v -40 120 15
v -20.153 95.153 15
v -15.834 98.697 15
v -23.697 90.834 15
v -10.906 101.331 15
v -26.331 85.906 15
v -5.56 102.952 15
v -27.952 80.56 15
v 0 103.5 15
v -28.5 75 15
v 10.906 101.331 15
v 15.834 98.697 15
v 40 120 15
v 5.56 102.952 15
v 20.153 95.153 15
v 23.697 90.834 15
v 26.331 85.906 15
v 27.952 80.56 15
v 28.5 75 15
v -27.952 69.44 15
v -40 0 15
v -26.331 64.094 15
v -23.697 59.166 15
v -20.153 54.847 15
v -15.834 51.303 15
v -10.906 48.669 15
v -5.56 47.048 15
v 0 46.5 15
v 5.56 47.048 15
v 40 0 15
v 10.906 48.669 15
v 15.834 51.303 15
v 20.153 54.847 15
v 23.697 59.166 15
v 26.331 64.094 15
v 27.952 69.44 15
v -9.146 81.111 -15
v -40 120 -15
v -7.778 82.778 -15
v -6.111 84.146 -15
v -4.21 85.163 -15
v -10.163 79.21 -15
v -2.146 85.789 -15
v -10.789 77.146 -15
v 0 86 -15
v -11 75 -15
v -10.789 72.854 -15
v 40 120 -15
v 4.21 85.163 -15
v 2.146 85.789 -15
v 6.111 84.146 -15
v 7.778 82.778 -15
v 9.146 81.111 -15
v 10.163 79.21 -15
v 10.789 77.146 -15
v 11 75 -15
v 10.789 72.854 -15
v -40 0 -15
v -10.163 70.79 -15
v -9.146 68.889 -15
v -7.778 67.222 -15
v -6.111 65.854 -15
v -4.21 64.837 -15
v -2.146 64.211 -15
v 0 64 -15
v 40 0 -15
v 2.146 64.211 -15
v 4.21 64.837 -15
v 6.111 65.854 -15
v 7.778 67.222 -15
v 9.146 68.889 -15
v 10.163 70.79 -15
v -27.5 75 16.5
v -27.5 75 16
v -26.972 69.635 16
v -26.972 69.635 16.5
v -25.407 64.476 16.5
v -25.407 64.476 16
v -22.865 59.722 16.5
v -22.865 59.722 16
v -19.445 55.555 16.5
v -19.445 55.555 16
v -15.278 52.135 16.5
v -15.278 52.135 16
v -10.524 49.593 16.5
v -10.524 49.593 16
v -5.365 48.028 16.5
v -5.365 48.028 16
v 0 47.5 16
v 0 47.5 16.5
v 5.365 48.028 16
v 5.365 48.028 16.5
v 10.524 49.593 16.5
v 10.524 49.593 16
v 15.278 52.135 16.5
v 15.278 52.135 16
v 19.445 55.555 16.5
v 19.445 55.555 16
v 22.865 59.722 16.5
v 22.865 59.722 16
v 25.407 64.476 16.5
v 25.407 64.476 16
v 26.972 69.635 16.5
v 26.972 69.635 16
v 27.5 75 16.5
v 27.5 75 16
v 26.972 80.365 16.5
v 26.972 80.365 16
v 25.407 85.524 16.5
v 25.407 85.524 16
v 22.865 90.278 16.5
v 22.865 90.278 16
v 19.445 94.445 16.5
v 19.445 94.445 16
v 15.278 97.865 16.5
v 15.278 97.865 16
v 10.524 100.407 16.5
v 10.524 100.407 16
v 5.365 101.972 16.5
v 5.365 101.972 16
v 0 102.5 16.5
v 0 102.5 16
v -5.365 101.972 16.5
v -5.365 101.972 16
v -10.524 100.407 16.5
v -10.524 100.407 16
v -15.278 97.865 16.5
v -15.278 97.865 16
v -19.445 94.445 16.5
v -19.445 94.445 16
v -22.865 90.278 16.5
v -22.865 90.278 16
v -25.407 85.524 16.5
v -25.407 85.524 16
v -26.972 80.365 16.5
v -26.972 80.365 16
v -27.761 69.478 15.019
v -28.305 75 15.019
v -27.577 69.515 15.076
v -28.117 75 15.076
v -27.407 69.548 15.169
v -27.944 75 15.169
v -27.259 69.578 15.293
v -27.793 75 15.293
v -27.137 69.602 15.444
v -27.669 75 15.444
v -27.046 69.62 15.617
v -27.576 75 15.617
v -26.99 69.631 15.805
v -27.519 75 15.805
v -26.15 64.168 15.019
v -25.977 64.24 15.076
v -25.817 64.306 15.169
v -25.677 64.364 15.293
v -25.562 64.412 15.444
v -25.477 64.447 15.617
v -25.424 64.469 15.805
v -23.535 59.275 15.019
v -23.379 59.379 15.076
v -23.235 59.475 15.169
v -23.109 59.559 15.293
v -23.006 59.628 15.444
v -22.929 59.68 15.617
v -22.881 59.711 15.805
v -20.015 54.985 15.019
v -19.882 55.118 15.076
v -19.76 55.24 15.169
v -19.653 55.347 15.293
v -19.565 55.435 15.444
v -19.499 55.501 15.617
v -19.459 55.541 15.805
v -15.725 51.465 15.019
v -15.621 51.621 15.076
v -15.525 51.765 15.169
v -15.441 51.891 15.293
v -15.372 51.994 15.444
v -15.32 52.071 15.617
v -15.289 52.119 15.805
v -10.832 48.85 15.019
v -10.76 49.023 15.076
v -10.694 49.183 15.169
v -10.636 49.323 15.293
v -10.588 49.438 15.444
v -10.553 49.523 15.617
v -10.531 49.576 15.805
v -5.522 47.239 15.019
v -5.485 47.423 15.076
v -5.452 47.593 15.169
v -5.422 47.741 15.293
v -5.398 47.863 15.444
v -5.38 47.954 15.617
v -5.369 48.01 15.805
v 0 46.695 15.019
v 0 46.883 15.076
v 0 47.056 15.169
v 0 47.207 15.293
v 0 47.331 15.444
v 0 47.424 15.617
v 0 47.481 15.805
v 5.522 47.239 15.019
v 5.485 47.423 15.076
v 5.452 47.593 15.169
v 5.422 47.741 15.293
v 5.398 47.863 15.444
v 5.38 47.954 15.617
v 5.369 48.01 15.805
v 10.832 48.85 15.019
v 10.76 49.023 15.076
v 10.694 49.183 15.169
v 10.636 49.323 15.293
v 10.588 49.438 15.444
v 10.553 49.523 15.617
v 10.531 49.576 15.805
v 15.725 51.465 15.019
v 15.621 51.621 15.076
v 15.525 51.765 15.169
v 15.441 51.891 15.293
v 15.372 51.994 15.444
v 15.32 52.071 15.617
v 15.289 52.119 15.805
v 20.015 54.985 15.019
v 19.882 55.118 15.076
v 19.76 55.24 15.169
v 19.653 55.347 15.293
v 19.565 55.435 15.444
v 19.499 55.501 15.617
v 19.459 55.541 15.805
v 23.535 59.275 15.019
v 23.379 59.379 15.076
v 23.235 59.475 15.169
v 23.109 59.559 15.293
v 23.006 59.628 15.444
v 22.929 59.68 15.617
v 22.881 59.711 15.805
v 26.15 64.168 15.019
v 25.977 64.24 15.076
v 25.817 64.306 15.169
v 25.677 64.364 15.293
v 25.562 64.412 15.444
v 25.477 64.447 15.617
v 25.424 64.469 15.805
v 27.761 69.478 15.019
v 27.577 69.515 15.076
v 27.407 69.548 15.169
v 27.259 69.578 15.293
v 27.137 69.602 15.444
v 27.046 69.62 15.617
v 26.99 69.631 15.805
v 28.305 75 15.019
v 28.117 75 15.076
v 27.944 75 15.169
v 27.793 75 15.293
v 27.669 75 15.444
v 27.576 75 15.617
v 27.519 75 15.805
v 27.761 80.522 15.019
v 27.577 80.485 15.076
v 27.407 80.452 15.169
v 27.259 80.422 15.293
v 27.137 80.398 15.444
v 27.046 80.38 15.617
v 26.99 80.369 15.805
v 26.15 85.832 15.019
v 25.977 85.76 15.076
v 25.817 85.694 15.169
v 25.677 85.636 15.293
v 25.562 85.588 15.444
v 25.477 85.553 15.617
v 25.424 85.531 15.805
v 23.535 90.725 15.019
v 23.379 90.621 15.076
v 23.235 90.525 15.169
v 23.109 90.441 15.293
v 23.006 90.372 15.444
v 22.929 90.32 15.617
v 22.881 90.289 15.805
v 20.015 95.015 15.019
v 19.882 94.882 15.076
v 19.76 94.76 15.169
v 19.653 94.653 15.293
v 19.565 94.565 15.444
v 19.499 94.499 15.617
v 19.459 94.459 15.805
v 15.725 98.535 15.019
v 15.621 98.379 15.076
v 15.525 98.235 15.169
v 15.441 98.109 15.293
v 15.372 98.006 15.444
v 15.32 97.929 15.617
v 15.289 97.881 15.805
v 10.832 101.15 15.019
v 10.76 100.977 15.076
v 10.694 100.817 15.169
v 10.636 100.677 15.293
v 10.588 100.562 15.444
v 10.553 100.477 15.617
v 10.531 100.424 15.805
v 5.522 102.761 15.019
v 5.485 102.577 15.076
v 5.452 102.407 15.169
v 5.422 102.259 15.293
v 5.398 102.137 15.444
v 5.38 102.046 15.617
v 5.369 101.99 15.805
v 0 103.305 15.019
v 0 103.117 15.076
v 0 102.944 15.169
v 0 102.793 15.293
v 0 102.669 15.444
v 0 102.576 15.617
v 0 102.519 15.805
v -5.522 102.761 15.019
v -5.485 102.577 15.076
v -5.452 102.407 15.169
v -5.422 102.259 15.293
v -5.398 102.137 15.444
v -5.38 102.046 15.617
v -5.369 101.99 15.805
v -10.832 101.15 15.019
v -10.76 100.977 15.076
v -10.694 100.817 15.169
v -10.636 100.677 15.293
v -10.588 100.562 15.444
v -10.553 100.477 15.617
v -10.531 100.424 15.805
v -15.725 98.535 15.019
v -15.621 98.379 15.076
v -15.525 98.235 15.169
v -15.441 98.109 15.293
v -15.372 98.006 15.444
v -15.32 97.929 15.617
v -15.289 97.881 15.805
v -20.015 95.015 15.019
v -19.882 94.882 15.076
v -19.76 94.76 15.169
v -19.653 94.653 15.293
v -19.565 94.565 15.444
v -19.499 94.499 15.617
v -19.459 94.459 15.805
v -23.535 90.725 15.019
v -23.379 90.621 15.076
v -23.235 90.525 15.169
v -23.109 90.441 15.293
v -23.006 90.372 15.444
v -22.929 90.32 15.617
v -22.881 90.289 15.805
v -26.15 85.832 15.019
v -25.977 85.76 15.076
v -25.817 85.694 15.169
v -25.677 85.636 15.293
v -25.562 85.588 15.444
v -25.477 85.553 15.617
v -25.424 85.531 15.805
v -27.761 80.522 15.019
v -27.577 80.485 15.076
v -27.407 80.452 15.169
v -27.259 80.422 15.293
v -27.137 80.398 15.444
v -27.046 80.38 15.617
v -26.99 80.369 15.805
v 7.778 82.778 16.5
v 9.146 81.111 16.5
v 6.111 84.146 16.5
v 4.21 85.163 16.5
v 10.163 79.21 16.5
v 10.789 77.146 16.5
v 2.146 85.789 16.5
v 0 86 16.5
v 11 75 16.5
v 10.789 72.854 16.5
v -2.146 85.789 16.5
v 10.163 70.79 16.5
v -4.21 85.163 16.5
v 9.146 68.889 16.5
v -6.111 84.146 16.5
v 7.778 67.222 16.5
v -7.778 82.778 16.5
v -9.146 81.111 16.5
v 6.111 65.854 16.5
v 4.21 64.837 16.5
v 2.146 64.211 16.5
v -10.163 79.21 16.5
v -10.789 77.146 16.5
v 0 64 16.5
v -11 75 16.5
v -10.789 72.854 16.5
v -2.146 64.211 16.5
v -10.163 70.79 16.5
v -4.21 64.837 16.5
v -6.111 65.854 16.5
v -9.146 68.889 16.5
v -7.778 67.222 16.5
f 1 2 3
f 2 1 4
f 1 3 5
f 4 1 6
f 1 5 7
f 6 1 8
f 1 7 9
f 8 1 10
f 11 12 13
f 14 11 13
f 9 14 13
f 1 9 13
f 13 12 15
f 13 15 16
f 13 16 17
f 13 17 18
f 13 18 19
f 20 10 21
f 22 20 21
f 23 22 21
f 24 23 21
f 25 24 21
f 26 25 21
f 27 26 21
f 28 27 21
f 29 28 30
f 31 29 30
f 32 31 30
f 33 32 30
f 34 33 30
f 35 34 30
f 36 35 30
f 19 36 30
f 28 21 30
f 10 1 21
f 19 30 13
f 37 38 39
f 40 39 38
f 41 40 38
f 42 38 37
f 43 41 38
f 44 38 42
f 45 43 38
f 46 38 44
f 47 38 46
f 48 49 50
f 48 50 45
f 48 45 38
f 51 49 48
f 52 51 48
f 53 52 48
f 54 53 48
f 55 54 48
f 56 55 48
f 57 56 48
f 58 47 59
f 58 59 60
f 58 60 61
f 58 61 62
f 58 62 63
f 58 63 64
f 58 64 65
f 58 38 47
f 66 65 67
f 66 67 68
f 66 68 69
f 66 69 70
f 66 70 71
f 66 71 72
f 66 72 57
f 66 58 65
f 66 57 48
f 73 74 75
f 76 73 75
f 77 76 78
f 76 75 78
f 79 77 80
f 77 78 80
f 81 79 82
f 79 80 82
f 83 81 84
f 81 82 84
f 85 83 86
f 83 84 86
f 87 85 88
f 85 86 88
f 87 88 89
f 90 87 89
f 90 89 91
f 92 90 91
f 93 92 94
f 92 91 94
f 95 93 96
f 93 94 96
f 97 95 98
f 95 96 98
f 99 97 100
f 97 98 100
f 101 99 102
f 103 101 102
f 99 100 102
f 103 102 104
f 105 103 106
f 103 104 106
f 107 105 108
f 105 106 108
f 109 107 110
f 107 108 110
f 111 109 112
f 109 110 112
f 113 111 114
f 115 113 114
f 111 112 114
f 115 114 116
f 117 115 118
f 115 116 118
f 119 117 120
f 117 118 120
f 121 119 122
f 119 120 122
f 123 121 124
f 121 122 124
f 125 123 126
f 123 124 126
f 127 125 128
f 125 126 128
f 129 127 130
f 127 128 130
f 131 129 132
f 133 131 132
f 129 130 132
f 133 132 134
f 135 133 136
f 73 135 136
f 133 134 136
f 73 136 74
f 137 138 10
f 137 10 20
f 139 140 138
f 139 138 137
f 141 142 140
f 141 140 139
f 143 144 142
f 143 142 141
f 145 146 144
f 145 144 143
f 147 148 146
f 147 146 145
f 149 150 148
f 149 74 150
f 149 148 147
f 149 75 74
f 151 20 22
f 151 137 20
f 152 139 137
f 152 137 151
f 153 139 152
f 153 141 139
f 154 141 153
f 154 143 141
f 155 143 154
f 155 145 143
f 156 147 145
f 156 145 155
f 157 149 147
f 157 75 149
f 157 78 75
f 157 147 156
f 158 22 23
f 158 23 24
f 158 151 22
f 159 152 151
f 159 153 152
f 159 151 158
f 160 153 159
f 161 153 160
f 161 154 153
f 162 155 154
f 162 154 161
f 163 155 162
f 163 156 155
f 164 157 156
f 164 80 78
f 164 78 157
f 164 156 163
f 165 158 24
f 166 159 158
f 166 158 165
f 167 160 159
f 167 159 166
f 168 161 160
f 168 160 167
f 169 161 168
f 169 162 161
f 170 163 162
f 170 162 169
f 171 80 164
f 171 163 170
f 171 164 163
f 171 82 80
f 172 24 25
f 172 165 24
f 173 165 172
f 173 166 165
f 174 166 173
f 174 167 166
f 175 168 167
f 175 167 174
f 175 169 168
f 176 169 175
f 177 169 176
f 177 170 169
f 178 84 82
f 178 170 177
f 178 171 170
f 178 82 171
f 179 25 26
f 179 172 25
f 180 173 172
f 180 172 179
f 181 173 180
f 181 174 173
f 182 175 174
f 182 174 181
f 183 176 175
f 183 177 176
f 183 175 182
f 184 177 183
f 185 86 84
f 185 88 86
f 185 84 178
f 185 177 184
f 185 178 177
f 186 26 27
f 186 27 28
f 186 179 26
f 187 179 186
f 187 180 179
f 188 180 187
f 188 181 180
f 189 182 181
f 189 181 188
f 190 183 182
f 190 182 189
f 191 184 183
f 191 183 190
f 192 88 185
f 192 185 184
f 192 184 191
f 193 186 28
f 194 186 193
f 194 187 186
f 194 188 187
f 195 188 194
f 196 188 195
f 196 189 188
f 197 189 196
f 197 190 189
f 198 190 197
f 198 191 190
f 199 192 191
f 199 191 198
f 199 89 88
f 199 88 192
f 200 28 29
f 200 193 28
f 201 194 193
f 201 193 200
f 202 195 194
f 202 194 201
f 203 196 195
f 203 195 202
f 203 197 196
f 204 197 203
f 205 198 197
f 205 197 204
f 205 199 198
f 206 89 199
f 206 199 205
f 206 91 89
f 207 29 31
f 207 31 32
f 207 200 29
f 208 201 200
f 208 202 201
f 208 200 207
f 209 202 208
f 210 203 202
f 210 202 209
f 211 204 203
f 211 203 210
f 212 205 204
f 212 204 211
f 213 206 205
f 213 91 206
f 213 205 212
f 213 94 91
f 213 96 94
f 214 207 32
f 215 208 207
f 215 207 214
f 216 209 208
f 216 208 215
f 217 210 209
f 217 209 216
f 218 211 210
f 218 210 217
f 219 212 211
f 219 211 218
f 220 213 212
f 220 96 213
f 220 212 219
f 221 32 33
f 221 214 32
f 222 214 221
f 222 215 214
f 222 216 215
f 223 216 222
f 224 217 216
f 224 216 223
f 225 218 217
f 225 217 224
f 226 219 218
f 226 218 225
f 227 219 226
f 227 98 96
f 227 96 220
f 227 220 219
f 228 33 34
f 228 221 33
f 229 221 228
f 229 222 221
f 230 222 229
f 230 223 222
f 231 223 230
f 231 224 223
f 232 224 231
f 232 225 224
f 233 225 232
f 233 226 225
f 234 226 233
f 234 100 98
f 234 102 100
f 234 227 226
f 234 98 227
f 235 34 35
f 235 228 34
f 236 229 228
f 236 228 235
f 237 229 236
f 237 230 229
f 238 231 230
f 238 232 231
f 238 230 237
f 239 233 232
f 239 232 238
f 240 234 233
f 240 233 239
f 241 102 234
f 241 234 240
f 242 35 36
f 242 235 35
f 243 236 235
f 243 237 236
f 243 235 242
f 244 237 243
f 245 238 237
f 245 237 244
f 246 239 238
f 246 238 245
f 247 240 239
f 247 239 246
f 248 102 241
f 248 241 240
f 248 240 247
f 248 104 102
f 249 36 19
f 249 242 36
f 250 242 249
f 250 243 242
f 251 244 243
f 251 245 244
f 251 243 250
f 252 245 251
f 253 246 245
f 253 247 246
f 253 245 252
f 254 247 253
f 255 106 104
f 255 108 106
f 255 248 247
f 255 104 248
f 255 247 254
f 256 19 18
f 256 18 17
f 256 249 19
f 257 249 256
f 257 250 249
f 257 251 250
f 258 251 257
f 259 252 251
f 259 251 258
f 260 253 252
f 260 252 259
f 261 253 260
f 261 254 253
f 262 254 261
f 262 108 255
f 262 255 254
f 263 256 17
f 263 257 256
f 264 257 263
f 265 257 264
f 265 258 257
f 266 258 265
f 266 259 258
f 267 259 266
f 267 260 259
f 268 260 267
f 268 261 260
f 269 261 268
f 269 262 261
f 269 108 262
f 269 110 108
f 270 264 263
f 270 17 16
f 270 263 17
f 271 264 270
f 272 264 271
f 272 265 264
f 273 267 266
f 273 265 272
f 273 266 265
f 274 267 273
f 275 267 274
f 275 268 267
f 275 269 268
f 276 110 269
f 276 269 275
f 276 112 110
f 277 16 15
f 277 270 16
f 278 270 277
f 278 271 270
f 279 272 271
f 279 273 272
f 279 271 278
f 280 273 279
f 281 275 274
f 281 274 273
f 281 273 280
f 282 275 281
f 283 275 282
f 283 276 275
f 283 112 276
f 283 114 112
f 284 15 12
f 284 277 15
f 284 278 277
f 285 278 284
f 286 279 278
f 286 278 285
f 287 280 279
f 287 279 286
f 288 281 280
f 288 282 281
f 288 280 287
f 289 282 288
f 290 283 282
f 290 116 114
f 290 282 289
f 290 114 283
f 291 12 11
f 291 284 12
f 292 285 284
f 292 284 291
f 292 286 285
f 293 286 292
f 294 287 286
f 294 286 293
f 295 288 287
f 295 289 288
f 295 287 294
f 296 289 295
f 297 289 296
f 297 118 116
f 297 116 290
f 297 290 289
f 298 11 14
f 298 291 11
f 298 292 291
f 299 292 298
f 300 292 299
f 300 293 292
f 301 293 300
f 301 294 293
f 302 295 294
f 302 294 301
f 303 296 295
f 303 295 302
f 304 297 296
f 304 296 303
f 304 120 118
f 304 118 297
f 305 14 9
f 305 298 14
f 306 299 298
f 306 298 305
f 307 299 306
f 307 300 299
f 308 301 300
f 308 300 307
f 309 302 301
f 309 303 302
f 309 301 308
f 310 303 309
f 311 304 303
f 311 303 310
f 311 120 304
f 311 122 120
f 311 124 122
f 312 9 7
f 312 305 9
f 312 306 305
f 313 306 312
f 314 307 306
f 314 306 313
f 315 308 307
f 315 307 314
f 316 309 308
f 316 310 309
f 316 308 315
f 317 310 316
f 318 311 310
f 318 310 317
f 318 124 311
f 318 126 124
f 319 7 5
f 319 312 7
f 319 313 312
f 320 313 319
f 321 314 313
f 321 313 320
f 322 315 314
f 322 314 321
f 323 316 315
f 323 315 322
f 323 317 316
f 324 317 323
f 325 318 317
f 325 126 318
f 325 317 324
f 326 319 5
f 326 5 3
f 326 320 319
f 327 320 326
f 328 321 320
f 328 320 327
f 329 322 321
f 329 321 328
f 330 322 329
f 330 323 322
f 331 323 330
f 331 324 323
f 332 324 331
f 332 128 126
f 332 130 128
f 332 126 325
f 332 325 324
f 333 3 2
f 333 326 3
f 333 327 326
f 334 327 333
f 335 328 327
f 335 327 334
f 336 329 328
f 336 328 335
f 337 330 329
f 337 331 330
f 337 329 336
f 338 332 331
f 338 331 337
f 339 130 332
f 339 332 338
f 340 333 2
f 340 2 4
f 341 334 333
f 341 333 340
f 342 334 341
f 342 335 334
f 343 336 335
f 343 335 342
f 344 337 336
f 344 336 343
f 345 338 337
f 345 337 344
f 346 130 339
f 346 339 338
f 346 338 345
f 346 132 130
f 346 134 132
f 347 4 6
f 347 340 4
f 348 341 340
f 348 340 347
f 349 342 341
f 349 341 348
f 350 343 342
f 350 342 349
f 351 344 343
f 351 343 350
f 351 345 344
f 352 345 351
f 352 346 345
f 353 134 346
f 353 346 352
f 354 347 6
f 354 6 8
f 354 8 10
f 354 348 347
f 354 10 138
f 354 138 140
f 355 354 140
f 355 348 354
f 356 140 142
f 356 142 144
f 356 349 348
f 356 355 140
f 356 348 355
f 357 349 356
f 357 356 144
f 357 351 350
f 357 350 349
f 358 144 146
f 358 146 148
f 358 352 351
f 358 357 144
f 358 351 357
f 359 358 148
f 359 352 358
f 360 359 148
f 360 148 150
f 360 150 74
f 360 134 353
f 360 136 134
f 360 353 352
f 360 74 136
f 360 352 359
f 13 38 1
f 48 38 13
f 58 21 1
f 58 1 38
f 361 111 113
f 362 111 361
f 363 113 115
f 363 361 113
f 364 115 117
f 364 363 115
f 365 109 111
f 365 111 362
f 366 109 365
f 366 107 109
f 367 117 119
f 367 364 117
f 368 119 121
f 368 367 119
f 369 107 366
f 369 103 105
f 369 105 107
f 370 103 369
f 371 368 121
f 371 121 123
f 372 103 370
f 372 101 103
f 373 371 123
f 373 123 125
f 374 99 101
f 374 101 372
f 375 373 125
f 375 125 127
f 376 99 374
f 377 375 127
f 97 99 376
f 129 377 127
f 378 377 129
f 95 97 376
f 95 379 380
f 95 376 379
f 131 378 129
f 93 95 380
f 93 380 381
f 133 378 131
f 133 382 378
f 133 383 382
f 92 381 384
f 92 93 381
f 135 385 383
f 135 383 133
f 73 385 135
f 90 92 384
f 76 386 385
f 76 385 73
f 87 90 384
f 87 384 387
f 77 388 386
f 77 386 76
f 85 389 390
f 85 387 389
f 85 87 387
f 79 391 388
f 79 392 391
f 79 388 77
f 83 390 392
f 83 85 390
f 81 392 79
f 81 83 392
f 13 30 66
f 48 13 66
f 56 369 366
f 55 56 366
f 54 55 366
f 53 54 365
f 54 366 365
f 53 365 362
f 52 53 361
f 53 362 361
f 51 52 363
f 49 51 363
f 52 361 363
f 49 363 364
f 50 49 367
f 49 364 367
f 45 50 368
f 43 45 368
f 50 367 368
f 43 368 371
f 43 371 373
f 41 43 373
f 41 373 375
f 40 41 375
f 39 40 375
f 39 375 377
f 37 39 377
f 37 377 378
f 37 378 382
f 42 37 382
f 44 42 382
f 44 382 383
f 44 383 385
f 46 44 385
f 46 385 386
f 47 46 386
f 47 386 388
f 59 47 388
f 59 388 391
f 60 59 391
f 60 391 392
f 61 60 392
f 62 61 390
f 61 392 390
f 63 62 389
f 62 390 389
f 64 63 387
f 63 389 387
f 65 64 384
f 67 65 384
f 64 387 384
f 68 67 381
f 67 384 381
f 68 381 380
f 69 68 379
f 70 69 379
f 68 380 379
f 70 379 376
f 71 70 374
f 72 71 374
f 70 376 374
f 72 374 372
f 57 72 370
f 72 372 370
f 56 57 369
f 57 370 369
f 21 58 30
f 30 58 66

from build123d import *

# Parameters (mm, degrees)
SKETCH_1_W          = 80
SKETCH_1_H          = 30
EXTRUDE_1_DEPTH     = 120
SKETCH_2_R          = 27.5
EXTRUDE_2_DEPTH     = 1.5
SKETCH_3_R          = 11
CUT_EXTRUDE_1_DEPTH = 39.5
FILLET_1_R          = 1


with BuildPart() as part:
    # 草图1 → 凸台-拉伸1 (new body)
    with BuildSketch(Plane(origin=(0, 0, 0), x_dir=(1, 0, 0), z_dir=(0, 1, 0))):
        Rectangle(SKETCH_1_W, SKETCH_1_H)
    extrude(amount=EXTRUDE_1_DEPTH)

    # 草图2 → 凸台-拉伸2 (add)
    with BuildSketch(Plane.XY.offset(15)):
        with Locations(Location((0, 75, 0), (0, 0, 180))):
            Circle(SKETCH_2_R)
    extrude(amount=EXTRUDE_2_DEPTH)

    # 草图3 → 切除-拉伸1 (cut)
    with BuildSketch(Plane.XY.offset(16.5)):
        with Locations((0, 75)):
            Circle(SKETCH_3_R)
    extrude(amount=-CUT_EXTRUDE_1_DEPTH, mode=Mode.SUBTRACT)

    # 圆角1
    fillet_1_edges = [part.edges().sort_by_distance(p)[0] for p in [
        (27.5, 75, 15),
    ]]
    fillet(fillet_1_edges, radius=FILLET_1_R)


solid = part.part
